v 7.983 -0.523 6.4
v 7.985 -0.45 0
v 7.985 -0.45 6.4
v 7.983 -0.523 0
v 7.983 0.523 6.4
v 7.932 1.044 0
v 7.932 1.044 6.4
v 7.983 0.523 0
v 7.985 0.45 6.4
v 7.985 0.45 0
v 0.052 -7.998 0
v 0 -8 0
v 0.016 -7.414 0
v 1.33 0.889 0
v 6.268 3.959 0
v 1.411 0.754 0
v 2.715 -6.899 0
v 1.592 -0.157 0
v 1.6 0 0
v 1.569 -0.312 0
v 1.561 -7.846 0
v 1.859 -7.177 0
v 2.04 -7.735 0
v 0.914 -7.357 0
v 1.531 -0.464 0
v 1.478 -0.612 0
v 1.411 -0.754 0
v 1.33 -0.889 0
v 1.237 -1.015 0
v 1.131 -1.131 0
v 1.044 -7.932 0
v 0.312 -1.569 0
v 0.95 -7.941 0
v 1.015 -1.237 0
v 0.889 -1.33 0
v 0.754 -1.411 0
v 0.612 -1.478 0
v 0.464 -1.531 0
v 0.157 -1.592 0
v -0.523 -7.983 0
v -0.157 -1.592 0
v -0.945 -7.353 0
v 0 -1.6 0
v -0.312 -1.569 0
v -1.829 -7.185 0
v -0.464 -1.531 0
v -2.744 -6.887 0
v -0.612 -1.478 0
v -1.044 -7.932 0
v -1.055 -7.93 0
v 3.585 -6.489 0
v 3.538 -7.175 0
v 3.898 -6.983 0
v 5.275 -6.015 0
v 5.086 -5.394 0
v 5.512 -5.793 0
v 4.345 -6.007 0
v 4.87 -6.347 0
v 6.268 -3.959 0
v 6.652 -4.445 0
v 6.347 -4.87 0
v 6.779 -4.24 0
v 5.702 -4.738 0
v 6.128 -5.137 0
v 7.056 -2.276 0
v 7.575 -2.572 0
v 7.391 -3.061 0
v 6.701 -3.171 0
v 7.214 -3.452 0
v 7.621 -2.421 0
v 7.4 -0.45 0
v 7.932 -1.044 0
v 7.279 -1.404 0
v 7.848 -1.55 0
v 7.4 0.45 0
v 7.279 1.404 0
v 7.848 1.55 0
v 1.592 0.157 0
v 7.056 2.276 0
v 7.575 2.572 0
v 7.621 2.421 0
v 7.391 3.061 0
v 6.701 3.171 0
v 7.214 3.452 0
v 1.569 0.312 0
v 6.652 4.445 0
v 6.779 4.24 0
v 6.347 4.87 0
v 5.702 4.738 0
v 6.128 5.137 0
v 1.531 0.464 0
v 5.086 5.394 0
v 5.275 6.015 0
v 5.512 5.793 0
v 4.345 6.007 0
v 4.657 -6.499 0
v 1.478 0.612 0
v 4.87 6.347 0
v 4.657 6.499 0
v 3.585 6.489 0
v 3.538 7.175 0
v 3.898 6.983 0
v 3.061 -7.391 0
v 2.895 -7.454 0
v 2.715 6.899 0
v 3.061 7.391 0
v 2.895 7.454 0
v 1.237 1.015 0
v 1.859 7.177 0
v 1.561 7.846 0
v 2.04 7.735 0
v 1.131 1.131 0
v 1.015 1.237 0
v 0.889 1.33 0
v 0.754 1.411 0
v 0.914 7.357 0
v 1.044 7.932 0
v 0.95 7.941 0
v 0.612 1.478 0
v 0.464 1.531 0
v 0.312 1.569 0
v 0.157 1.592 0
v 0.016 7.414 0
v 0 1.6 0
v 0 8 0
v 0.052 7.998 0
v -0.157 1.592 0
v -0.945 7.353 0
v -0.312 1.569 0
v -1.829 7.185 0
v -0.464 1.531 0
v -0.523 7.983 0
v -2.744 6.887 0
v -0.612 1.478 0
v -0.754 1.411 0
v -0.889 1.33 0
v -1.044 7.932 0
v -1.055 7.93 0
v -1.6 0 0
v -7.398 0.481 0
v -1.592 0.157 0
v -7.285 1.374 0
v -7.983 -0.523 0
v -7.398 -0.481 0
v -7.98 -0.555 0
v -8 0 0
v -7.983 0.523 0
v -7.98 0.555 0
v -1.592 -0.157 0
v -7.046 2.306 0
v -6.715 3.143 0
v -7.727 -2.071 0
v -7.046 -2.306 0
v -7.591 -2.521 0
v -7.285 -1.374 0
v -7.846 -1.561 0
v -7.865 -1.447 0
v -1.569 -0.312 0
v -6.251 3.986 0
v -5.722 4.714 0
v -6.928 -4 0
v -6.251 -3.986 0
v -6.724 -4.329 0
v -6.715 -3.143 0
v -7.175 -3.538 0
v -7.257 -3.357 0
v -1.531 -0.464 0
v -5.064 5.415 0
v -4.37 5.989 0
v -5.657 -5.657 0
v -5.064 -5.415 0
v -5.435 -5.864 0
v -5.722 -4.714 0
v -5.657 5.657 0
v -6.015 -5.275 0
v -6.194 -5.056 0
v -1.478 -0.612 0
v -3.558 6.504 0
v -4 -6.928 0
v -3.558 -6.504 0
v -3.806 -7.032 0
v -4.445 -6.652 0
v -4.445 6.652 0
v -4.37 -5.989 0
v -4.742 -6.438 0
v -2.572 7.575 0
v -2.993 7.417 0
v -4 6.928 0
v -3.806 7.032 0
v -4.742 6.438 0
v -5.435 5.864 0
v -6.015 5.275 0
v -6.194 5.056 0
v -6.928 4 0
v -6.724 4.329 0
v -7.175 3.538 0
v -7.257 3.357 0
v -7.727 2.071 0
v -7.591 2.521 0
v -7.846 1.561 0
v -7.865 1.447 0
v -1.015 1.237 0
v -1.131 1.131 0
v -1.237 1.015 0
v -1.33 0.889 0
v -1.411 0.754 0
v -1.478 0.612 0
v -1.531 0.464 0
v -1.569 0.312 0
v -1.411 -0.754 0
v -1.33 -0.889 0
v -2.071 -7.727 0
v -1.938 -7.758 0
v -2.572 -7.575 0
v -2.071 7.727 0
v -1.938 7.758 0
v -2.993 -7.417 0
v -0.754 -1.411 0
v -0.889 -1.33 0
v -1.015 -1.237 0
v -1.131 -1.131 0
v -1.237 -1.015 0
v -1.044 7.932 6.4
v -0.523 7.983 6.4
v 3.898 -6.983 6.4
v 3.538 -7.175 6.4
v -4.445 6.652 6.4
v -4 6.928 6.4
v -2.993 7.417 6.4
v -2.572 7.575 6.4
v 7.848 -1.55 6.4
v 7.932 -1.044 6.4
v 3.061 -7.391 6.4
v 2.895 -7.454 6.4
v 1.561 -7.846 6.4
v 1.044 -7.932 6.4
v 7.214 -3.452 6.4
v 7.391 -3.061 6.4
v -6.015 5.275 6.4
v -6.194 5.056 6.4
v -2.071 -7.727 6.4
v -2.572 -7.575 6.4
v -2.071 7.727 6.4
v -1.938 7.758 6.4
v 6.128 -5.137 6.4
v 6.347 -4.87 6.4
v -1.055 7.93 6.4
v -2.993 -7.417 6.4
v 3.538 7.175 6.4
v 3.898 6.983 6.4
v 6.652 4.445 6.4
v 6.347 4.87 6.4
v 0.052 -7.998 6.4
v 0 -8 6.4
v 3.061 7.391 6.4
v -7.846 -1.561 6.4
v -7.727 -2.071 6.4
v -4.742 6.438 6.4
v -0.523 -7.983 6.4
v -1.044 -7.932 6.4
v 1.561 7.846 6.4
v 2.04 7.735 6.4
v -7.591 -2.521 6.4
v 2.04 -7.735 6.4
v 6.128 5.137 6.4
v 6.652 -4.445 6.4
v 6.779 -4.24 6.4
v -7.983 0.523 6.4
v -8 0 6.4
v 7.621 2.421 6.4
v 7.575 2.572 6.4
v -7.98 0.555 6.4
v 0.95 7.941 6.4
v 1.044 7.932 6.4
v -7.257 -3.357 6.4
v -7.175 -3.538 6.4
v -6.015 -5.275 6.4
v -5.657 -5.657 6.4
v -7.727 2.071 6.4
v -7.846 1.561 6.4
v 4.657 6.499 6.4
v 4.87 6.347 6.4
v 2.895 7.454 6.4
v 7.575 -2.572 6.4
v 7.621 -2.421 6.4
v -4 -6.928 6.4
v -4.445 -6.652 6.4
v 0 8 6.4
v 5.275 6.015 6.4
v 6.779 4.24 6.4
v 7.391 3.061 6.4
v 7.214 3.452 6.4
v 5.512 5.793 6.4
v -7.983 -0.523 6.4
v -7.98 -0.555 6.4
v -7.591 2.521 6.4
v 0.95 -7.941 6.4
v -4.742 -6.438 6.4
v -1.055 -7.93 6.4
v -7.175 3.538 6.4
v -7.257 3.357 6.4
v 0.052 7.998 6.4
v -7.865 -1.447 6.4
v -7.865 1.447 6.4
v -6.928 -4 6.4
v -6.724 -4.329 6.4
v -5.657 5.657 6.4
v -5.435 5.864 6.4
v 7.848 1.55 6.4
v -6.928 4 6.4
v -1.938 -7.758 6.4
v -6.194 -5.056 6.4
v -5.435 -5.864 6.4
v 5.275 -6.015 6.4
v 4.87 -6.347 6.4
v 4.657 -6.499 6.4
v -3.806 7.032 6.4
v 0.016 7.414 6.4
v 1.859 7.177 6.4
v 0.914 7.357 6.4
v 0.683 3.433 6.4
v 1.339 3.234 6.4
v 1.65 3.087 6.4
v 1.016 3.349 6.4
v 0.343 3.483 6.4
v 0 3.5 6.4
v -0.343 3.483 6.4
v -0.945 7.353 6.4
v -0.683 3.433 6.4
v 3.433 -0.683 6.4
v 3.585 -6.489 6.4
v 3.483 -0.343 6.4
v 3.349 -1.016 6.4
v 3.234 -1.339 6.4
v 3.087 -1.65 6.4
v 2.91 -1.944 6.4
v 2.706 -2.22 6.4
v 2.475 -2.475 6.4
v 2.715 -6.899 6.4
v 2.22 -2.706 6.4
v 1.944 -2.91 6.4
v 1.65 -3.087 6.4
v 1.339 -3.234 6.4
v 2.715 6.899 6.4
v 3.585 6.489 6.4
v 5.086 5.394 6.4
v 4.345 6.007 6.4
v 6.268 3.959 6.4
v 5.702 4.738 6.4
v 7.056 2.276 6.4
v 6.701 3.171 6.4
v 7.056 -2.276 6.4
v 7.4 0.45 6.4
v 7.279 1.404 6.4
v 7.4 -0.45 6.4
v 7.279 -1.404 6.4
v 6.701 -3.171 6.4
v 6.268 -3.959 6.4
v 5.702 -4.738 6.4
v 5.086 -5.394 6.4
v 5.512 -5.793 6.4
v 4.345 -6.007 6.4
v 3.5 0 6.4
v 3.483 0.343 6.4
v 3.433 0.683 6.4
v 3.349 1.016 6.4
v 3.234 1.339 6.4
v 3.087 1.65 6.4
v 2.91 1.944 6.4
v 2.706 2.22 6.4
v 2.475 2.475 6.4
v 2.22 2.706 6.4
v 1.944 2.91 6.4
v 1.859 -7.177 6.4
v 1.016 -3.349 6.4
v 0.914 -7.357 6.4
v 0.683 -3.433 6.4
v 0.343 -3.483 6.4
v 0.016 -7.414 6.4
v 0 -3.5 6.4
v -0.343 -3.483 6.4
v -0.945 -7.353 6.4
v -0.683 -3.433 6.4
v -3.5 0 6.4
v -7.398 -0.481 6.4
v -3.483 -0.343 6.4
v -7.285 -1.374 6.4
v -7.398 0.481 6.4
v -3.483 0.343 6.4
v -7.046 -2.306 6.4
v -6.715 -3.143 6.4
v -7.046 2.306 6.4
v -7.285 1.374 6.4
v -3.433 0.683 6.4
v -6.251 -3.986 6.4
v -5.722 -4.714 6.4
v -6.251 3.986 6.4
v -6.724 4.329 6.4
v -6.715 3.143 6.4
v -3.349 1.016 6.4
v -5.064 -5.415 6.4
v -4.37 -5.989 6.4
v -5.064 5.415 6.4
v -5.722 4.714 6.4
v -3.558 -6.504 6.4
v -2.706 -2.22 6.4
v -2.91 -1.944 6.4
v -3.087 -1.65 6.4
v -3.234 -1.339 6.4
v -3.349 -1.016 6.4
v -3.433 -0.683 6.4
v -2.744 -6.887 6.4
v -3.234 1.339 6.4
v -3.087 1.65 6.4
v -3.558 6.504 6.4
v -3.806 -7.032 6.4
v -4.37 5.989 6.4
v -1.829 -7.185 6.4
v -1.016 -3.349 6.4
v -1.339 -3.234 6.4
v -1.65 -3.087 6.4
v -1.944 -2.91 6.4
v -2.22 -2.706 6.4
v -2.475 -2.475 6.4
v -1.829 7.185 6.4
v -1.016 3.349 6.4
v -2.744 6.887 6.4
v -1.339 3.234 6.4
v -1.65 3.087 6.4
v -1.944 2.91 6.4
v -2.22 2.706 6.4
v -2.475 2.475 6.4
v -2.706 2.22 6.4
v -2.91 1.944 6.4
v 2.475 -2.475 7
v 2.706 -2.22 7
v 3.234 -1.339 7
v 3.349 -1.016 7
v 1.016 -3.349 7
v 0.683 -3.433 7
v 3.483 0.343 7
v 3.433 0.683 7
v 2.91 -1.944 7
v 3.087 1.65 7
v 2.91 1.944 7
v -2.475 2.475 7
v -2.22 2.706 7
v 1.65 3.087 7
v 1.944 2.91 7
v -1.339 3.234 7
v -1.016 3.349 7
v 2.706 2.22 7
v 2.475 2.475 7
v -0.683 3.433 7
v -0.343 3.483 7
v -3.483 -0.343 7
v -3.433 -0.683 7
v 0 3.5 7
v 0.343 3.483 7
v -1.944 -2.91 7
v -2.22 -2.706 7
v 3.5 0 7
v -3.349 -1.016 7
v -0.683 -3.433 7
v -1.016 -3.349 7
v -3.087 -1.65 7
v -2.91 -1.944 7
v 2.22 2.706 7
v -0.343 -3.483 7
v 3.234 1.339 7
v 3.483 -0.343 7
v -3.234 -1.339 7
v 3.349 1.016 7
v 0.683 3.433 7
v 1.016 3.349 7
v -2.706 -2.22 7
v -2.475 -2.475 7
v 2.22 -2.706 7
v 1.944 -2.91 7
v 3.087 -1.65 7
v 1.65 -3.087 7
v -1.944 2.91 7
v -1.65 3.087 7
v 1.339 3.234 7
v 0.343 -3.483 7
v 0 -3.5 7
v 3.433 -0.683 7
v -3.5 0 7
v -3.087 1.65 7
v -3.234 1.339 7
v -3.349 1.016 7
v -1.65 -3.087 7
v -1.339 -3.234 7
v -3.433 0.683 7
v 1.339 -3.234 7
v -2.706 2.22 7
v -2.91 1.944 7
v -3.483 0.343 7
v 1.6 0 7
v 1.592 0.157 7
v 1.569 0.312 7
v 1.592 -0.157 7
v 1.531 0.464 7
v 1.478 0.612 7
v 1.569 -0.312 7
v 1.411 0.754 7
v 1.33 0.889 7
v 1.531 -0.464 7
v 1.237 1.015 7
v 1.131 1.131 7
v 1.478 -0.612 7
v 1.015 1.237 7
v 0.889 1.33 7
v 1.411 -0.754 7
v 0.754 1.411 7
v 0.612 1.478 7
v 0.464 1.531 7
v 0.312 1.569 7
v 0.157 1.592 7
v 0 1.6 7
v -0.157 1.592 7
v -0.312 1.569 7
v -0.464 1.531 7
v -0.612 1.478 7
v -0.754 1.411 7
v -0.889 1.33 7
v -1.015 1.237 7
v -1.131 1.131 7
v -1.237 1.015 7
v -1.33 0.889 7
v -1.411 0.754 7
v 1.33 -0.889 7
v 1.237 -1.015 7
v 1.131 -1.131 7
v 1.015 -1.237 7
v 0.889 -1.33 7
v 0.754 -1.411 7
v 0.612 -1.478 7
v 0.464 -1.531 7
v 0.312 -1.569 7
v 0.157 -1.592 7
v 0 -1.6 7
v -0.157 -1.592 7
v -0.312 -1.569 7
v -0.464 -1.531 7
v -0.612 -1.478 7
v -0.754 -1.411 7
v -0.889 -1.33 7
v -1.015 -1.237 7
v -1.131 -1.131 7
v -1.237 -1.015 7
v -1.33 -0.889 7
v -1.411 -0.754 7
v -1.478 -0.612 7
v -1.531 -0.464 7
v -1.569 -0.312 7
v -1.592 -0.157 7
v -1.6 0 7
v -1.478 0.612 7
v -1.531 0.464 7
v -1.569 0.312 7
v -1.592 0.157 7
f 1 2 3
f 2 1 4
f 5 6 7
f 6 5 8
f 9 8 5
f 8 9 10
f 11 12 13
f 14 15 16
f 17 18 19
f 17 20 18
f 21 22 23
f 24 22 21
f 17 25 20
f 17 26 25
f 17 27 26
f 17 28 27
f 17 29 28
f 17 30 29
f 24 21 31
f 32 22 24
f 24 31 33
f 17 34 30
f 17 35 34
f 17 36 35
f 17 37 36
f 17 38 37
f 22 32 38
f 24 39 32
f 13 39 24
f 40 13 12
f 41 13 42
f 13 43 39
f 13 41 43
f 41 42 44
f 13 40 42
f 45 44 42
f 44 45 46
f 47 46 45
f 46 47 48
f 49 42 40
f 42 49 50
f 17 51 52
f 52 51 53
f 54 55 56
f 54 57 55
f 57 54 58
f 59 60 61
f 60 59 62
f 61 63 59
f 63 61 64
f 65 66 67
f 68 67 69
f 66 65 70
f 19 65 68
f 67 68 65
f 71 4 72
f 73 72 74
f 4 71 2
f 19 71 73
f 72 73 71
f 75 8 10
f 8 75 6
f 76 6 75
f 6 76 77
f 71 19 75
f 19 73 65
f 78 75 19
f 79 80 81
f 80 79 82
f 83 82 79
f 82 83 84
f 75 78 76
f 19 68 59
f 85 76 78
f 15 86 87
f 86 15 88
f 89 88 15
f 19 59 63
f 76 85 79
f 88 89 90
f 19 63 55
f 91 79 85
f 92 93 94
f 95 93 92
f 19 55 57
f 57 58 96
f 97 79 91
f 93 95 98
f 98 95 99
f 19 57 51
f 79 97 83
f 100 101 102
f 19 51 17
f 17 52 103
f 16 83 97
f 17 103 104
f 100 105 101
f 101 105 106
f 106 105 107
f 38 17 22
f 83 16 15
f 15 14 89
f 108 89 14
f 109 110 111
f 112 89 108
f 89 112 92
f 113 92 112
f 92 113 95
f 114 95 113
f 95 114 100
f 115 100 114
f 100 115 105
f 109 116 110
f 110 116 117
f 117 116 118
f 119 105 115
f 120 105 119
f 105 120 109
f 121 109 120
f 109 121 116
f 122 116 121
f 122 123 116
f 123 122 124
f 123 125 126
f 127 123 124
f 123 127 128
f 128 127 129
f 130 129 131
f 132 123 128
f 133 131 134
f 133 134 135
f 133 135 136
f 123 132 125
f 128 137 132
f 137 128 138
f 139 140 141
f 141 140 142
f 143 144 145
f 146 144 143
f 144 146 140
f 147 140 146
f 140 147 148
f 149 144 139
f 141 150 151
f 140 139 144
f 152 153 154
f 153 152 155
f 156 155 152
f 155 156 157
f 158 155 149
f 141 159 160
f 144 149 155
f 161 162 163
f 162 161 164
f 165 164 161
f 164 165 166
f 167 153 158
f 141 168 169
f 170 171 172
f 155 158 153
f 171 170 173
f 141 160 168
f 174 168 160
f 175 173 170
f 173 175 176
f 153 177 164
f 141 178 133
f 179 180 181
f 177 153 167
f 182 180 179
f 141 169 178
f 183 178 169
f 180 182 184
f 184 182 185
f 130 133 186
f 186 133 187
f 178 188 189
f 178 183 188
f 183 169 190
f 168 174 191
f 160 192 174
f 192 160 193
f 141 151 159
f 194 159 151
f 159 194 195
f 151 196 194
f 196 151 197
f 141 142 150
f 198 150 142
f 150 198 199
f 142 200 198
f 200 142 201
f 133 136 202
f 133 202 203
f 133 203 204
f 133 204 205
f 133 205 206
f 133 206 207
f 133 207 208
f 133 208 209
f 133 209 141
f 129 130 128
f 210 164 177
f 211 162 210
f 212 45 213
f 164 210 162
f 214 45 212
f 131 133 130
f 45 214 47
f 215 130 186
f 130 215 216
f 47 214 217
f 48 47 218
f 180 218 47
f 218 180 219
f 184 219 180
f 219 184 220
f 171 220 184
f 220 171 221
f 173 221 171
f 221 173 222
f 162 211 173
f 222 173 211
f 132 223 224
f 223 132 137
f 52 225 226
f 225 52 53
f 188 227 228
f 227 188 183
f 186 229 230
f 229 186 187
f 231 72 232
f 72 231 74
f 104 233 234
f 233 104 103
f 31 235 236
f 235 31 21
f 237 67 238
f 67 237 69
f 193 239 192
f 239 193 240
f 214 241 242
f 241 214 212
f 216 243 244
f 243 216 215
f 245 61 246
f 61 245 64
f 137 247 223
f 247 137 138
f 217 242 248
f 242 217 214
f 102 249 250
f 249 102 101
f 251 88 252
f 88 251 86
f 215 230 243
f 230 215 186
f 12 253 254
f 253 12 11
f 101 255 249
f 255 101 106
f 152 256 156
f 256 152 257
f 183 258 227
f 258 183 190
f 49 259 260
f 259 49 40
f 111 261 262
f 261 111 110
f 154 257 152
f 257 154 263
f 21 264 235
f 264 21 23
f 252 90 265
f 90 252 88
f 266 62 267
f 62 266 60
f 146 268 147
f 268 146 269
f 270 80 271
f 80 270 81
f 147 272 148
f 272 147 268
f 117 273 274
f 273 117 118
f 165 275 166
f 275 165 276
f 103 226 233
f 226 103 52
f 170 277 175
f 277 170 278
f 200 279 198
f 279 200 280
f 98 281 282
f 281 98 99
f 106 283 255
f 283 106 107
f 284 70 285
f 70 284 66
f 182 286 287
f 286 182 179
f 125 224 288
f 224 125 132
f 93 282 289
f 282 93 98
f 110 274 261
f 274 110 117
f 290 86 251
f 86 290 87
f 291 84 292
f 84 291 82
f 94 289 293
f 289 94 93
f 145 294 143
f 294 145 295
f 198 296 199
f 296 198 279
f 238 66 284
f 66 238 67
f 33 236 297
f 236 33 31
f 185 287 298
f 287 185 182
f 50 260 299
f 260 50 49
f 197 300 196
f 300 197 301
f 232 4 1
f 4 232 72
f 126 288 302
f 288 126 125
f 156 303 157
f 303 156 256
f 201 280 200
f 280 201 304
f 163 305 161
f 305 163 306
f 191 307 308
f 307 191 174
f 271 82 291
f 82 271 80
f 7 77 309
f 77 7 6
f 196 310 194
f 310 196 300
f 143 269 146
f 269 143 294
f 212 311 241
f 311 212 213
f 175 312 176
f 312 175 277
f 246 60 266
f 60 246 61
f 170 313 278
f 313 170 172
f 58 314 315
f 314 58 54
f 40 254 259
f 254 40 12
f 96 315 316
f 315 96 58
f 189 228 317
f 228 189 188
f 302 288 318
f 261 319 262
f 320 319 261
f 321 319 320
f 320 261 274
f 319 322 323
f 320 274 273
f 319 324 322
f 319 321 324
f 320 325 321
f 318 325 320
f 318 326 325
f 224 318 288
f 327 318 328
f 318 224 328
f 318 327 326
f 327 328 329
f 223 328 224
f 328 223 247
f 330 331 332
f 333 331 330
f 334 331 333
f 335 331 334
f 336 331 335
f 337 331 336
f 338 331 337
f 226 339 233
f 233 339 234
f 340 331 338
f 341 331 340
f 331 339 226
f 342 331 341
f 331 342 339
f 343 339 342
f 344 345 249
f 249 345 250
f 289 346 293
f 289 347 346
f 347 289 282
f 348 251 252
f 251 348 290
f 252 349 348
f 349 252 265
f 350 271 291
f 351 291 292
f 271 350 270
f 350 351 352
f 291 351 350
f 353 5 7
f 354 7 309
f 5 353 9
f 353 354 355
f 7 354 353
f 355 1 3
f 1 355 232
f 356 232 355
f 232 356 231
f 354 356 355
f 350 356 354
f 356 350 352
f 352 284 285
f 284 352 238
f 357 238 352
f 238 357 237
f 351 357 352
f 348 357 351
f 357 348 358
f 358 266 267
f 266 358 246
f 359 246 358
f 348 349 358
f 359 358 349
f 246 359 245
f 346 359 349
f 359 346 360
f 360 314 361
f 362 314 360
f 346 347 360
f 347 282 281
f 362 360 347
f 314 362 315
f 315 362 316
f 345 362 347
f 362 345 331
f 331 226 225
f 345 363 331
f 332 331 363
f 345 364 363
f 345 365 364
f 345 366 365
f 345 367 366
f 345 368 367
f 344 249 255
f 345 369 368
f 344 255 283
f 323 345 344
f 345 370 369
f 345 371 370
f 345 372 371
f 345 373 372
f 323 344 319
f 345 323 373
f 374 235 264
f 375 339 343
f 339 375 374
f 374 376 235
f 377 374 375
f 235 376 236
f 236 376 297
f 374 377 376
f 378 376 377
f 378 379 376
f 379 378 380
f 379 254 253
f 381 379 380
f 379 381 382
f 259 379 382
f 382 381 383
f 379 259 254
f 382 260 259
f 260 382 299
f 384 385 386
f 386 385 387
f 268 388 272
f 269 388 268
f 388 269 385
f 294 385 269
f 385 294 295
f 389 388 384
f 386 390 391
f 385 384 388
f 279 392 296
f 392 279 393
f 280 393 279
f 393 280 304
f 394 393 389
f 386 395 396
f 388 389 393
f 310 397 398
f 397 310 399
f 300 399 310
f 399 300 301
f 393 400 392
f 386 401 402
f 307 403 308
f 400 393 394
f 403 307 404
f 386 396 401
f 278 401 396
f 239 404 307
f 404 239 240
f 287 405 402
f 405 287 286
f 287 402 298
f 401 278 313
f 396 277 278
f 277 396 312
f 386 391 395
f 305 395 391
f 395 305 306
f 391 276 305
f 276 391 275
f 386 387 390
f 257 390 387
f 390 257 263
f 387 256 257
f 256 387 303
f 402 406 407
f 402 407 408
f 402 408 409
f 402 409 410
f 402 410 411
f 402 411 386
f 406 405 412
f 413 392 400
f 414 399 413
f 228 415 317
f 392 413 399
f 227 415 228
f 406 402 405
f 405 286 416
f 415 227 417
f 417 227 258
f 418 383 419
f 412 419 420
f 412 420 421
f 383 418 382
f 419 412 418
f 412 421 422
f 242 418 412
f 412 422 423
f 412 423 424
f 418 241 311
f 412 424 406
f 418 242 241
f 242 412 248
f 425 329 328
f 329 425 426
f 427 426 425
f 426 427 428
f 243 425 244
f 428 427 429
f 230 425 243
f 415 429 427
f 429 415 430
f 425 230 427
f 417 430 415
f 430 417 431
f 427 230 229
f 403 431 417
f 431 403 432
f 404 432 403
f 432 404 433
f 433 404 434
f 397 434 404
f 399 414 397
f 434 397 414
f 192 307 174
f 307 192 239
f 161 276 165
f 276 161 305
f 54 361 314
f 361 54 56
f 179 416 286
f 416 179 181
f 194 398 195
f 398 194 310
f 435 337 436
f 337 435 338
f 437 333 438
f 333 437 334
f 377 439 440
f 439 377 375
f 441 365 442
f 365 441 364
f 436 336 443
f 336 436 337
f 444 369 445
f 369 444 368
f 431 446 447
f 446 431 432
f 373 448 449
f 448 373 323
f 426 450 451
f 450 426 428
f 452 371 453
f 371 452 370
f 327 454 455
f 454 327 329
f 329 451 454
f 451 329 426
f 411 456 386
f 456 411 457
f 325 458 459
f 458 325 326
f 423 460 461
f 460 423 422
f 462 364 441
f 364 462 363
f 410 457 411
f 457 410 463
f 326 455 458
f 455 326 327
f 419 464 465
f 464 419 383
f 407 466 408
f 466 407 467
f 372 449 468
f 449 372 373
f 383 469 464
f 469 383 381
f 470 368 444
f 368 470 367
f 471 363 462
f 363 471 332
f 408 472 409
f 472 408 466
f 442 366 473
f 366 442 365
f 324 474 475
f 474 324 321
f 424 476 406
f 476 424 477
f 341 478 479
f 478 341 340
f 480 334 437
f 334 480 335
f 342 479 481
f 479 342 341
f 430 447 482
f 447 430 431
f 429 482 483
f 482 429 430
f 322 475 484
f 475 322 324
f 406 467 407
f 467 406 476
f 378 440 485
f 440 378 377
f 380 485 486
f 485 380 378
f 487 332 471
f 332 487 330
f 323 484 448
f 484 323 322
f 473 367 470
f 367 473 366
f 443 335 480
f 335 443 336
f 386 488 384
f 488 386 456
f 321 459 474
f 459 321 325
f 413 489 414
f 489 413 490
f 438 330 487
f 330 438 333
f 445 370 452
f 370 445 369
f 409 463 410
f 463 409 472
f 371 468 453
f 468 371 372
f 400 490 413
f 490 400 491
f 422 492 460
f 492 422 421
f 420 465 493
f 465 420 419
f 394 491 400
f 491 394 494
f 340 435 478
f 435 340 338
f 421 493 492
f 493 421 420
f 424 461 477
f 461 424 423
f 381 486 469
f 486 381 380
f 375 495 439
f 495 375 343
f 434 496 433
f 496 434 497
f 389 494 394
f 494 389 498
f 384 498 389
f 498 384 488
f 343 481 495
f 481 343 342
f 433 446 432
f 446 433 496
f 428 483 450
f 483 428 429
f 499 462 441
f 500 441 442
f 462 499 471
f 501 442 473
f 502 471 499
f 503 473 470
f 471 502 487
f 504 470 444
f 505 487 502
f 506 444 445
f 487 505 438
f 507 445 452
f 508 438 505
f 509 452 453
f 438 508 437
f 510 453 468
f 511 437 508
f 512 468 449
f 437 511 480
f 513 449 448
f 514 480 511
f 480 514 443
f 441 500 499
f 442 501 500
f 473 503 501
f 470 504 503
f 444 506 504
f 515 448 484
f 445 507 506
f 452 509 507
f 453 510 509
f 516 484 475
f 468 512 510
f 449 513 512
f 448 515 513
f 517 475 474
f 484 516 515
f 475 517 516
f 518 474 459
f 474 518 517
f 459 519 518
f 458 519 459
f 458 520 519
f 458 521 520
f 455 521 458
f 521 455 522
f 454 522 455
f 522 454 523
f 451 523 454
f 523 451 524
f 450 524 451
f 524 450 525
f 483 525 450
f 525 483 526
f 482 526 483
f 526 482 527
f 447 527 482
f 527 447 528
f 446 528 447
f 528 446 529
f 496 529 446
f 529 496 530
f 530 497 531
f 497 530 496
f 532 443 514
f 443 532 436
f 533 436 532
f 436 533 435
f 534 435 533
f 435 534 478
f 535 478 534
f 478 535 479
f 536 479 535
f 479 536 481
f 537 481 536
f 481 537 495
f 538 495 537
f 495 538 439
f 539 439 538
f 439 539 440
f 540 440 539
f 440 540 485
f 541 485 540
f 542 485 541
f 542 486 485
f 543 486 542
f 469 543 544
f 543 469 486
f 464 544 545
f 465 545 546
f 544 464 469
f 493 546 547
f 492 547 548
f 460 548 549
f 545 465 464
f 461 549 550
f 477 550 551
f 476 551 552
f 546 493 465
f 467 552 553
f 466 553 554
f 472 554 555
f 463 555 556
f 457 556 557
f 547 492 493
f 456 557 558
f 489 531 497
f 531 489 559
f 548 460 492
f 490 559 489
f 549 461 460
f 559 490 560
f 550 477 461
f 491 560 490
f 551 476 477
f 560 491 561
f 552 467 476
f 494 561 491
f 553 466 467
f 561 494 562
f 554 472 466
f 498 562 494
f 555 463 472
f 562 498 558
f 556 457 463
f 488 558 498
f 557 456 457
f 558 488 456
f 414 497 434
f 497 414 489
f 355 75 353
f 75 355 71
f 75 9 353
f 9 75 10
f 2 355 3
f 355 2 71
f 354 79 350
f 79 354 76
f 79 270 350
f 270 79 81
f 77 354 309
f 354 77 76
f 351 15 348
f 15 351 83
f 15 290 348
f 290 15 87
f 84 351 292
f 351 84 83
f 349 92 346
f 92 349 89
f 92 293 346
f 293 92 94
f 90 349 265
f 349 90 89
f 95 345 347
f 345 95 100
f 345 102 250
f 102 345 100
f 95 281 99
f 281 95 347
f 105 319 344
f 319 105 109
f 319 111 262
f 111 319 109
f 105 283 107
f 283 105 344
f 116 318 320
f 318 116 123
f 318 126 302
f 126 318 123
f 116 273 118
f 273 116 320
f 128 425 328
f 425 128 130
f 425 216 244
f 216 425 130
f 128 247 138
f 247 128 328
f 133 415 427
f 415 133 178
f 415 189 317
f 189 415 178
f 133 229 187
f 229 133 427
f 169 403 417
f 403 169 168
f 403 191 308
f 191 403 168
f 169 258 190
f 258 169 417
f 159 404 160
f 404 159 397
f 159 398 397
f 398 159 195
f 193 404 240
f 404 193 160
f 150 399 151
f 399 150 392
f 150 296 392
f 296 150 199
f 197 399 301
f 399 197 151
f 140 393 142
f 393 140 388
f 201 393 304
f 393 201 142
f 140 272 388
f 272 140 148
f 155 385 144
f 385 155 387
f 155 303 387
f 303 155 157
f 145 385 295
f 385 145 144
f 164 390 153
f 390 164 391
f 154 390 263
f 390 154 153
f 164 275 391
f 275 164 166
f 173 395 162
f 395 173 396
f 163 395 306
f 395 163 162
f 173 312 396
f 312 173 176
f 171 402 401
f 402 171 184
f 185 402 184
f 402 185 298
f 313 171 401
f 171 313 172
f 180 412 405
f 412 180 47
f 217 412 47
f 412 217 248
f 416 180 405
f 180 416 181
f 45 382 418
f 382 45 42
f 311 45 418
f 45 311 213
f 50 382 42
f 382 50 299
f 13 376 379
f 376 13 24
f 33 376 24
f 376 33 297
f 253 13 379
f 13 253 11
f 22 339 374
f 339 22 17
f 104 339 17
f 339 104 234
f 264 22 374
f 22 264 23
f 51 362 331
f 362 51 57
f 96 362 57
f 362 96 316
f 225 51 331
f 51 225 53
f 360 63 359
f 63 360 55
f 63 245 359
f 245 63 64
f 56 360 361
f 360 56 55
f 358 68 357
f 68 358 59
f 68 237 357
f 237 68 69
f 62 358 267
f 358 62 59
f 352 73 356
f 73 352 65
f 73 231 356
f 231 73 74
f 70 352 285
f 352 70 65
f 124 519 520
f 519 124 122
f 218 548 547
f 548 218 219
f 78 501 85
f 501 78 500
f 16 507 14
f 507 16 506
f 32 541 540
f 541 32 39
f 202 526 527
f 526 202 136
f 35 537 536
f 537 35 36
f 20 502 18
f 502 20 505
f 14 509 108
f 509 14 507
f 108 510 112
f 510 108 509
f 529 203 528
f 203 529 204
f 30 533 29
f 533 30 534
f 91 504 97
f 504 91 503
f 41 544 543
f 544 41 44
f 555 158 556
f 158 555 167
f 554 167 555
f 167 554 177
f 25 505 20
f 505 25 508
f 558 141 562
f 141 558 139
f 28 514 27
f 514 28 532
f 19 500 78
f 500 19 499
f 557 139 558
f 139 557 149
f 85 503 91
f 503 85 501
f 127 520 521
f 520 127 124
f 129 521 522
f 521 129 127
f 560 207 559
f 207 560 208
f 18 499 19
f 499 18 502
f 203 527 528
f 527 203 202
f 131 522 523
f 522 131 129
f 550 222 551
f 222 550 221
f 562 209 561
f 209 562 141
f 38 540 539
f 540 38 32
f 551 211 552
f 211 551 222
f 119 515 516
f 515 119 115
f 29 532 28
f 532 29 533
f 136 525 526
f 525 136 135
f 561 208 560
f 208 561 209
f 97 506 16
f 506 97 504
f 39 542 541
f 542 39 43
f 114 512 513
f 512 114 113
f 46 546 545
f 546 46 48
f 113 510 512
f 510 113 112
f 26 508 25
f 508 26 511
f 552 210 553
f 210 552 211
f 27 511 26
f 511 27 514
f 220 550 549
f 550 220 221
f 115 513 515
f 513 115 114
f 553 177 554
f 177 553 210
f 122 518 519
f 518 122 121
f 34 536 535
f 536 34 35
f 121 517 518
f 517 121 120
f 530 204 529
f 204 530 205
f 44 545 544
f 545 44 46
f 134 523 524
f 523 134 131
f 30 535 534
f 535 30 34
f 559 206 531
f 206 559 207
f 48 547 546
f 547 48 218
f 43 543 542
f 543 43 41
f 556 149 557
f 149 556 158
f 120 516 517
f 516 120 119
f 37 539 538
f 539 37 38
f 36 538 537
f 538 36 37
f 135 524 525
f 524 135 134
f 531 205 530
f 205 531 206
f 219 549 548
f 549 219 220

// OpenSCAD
// file: ../config.scad
// =====================================================================
//  Brick system: global configuration
//
//  Every grid and fit value from SPEC.md lives here. Values marked
//  [fit] are the ones to re-tune per printer/filament with the
//  calibration coupon (parts.scad -> coupon()). Override any of them
//  from the command line without editing this file:
//
//    openscad -D 'RIB_D=4.8' -o plate.stl examples/plates.scad
//
//  All lengths in mm. Designed for a 0.4 mm nozzle and 0.2 mm layers.
// =====================================================================

$fn = 64;
eps = 0.01;               // overlap for clean booleans (not a real dimension)
FONT = "DejaVu Sans:style=Bold";

// ---------- print process ----------
LINE   = 0.45;            // extrusion width; walls are multiples (see WALL_*)
LAYER  = 0.2;             // layer height; heights are multiples of this
WALL_1 = 0.9;             // 2 lines, the minimum anywhere
WALL_2 = 1.3;             // 3 lines
WALL_3 = 1.8;             // 4 lines
BRIDGE_MAX = 6.0;         // longest flat bridge allowed

// ---------- grid ----------
PITCH = 8.0;              // horizontal grid
PLATE = 3.2;              // plate height
BRICK = 9.6;              // 3 plates
GAP   = 0.1;              // per side; outer size = n*8 - 0.2

// ---------- connector 1: stud + crush-rib socket ----------
STUD_D        = 5.0;
STUD_H        = 1.6;
STUD_CHAMFER  = 0.4;      // lead-in on top of stud
STUD_FILLET   = 0.4;      // root fillet against layer-line breakage
SOCKET_D      = 5.4;      // bore: 0.2 mm clearance per side before ribs
SOCKET_DEPTH  = 1.8;      // leaves a 1.4 mm roof in a 3.2 mm plate
SOCKET_CHAMF  = 0.4;      // entry chamfer (also hides elephant's foot)
RIB_R         = 0.5;      // rib = vertical half-cylinder
RIB_N         = 4;
RIB_D         = 4.75;     // [fit] diameter across rib tips (4.8 / 4.7 tested good)
ROOF          = PLATE - SOCKET_DEPTH;   // 1.4 mm of material above a socket in a plate

// ---------- connector 2: slot + flat clip ----------
CLIP_T      = 2.0;        // thickness (Z when printed flat)
CLIP_W      = 5.0;        // body width
CLIP_HALF   = 3.4;        // engagement depth per side (clip length 6.8)
CLIP_ARM    = 0.9;        // spring arm width (2 lines)
CLIP_BAND   = 0.8;        // solid centre band
BARB        = 0.3;        // barb height above body width, per side
BARB_LEAD   = 0.15;       // chamfer at arm tip
CLIP_ROOT_R = 0.3;        // fillet radius at the arm roots
SLOT_CLEAR  = 0.15;       // [fit] clearance per side in the thickness direction
SLOT_INTERF = 0.10;       // [fit] barb interference per side
SLOT_T      = CLIP_T + 2*SLOT_CLEAR;   // 2.3
SLOT_DEPTH  = CLIP_HALF + 0.2;         // 3.6
SLOT_CHAMF  = 0.4;        // entry chamfer of top-face slots
SIDE_SLOT_MIN_H = 2*PLATE;             // parts lower than 6.4 get no side slots
function slot_len(interf = SLOT_INTERF) = CLIP_W + 2*(BARB - interf);   // 5.4

// ---------- axles ----------
AXLE_D       = 3.0;       // steel rod / M3 screw
BORE_SPIN_D  = 3.2;       // [fit] free-running teardrop bore (3.3 too wobbly)
BORE_GRIP_D  = 2.8;       // [fit] diameter across rib tips of a grip bore
GRIP_BORE_D  = 3.4;       // base bore under the grip ribs
AXLE_FLAT    = 0.3;       // flat on the bed side of a printed axle

// ---------- part design values (not connector fits) ----------
HINGE_CLEAR    = 0.3;     // gap between interleaved hinge knuckles, radial and axial
WHEEL_CHANNEL  = 1.2;     // depth of the tyre channel in a wheel rim
TIRE_STRETCH   = 0.2;     // tyre inner radius is this much smaller than the channel (TPU)

// ---------- helpers ----------
function cell(i) = PITCH*i + PITCH/2;          // centre of grid cell i
function snap_layer(h) = round(h / LAYER) * LAYER;
// main file
// Wheel hub, printed flat. Spins on a Ø3 axle; keep it on with a grip collar.
include <../parts.scad>

/* [Wheel] */
// Rim diameter (mm)
d = 16; // [10:0.2:80]
// Width (mm)
w = 6.4; // [3.2:0.2:30]
// Tread: none, printed grooves, or a channel for the TPU tyre
tread = "grooves"; // [none, grooves, tire]
// Lightening holes (when there is room)
holes = true;
// Spacer ring height on the inner face (mm)
boss = 0.6; // [0:0.2:2]

wheel(d = d, w = w, tread = tread, holes = holes, boss = boss);
